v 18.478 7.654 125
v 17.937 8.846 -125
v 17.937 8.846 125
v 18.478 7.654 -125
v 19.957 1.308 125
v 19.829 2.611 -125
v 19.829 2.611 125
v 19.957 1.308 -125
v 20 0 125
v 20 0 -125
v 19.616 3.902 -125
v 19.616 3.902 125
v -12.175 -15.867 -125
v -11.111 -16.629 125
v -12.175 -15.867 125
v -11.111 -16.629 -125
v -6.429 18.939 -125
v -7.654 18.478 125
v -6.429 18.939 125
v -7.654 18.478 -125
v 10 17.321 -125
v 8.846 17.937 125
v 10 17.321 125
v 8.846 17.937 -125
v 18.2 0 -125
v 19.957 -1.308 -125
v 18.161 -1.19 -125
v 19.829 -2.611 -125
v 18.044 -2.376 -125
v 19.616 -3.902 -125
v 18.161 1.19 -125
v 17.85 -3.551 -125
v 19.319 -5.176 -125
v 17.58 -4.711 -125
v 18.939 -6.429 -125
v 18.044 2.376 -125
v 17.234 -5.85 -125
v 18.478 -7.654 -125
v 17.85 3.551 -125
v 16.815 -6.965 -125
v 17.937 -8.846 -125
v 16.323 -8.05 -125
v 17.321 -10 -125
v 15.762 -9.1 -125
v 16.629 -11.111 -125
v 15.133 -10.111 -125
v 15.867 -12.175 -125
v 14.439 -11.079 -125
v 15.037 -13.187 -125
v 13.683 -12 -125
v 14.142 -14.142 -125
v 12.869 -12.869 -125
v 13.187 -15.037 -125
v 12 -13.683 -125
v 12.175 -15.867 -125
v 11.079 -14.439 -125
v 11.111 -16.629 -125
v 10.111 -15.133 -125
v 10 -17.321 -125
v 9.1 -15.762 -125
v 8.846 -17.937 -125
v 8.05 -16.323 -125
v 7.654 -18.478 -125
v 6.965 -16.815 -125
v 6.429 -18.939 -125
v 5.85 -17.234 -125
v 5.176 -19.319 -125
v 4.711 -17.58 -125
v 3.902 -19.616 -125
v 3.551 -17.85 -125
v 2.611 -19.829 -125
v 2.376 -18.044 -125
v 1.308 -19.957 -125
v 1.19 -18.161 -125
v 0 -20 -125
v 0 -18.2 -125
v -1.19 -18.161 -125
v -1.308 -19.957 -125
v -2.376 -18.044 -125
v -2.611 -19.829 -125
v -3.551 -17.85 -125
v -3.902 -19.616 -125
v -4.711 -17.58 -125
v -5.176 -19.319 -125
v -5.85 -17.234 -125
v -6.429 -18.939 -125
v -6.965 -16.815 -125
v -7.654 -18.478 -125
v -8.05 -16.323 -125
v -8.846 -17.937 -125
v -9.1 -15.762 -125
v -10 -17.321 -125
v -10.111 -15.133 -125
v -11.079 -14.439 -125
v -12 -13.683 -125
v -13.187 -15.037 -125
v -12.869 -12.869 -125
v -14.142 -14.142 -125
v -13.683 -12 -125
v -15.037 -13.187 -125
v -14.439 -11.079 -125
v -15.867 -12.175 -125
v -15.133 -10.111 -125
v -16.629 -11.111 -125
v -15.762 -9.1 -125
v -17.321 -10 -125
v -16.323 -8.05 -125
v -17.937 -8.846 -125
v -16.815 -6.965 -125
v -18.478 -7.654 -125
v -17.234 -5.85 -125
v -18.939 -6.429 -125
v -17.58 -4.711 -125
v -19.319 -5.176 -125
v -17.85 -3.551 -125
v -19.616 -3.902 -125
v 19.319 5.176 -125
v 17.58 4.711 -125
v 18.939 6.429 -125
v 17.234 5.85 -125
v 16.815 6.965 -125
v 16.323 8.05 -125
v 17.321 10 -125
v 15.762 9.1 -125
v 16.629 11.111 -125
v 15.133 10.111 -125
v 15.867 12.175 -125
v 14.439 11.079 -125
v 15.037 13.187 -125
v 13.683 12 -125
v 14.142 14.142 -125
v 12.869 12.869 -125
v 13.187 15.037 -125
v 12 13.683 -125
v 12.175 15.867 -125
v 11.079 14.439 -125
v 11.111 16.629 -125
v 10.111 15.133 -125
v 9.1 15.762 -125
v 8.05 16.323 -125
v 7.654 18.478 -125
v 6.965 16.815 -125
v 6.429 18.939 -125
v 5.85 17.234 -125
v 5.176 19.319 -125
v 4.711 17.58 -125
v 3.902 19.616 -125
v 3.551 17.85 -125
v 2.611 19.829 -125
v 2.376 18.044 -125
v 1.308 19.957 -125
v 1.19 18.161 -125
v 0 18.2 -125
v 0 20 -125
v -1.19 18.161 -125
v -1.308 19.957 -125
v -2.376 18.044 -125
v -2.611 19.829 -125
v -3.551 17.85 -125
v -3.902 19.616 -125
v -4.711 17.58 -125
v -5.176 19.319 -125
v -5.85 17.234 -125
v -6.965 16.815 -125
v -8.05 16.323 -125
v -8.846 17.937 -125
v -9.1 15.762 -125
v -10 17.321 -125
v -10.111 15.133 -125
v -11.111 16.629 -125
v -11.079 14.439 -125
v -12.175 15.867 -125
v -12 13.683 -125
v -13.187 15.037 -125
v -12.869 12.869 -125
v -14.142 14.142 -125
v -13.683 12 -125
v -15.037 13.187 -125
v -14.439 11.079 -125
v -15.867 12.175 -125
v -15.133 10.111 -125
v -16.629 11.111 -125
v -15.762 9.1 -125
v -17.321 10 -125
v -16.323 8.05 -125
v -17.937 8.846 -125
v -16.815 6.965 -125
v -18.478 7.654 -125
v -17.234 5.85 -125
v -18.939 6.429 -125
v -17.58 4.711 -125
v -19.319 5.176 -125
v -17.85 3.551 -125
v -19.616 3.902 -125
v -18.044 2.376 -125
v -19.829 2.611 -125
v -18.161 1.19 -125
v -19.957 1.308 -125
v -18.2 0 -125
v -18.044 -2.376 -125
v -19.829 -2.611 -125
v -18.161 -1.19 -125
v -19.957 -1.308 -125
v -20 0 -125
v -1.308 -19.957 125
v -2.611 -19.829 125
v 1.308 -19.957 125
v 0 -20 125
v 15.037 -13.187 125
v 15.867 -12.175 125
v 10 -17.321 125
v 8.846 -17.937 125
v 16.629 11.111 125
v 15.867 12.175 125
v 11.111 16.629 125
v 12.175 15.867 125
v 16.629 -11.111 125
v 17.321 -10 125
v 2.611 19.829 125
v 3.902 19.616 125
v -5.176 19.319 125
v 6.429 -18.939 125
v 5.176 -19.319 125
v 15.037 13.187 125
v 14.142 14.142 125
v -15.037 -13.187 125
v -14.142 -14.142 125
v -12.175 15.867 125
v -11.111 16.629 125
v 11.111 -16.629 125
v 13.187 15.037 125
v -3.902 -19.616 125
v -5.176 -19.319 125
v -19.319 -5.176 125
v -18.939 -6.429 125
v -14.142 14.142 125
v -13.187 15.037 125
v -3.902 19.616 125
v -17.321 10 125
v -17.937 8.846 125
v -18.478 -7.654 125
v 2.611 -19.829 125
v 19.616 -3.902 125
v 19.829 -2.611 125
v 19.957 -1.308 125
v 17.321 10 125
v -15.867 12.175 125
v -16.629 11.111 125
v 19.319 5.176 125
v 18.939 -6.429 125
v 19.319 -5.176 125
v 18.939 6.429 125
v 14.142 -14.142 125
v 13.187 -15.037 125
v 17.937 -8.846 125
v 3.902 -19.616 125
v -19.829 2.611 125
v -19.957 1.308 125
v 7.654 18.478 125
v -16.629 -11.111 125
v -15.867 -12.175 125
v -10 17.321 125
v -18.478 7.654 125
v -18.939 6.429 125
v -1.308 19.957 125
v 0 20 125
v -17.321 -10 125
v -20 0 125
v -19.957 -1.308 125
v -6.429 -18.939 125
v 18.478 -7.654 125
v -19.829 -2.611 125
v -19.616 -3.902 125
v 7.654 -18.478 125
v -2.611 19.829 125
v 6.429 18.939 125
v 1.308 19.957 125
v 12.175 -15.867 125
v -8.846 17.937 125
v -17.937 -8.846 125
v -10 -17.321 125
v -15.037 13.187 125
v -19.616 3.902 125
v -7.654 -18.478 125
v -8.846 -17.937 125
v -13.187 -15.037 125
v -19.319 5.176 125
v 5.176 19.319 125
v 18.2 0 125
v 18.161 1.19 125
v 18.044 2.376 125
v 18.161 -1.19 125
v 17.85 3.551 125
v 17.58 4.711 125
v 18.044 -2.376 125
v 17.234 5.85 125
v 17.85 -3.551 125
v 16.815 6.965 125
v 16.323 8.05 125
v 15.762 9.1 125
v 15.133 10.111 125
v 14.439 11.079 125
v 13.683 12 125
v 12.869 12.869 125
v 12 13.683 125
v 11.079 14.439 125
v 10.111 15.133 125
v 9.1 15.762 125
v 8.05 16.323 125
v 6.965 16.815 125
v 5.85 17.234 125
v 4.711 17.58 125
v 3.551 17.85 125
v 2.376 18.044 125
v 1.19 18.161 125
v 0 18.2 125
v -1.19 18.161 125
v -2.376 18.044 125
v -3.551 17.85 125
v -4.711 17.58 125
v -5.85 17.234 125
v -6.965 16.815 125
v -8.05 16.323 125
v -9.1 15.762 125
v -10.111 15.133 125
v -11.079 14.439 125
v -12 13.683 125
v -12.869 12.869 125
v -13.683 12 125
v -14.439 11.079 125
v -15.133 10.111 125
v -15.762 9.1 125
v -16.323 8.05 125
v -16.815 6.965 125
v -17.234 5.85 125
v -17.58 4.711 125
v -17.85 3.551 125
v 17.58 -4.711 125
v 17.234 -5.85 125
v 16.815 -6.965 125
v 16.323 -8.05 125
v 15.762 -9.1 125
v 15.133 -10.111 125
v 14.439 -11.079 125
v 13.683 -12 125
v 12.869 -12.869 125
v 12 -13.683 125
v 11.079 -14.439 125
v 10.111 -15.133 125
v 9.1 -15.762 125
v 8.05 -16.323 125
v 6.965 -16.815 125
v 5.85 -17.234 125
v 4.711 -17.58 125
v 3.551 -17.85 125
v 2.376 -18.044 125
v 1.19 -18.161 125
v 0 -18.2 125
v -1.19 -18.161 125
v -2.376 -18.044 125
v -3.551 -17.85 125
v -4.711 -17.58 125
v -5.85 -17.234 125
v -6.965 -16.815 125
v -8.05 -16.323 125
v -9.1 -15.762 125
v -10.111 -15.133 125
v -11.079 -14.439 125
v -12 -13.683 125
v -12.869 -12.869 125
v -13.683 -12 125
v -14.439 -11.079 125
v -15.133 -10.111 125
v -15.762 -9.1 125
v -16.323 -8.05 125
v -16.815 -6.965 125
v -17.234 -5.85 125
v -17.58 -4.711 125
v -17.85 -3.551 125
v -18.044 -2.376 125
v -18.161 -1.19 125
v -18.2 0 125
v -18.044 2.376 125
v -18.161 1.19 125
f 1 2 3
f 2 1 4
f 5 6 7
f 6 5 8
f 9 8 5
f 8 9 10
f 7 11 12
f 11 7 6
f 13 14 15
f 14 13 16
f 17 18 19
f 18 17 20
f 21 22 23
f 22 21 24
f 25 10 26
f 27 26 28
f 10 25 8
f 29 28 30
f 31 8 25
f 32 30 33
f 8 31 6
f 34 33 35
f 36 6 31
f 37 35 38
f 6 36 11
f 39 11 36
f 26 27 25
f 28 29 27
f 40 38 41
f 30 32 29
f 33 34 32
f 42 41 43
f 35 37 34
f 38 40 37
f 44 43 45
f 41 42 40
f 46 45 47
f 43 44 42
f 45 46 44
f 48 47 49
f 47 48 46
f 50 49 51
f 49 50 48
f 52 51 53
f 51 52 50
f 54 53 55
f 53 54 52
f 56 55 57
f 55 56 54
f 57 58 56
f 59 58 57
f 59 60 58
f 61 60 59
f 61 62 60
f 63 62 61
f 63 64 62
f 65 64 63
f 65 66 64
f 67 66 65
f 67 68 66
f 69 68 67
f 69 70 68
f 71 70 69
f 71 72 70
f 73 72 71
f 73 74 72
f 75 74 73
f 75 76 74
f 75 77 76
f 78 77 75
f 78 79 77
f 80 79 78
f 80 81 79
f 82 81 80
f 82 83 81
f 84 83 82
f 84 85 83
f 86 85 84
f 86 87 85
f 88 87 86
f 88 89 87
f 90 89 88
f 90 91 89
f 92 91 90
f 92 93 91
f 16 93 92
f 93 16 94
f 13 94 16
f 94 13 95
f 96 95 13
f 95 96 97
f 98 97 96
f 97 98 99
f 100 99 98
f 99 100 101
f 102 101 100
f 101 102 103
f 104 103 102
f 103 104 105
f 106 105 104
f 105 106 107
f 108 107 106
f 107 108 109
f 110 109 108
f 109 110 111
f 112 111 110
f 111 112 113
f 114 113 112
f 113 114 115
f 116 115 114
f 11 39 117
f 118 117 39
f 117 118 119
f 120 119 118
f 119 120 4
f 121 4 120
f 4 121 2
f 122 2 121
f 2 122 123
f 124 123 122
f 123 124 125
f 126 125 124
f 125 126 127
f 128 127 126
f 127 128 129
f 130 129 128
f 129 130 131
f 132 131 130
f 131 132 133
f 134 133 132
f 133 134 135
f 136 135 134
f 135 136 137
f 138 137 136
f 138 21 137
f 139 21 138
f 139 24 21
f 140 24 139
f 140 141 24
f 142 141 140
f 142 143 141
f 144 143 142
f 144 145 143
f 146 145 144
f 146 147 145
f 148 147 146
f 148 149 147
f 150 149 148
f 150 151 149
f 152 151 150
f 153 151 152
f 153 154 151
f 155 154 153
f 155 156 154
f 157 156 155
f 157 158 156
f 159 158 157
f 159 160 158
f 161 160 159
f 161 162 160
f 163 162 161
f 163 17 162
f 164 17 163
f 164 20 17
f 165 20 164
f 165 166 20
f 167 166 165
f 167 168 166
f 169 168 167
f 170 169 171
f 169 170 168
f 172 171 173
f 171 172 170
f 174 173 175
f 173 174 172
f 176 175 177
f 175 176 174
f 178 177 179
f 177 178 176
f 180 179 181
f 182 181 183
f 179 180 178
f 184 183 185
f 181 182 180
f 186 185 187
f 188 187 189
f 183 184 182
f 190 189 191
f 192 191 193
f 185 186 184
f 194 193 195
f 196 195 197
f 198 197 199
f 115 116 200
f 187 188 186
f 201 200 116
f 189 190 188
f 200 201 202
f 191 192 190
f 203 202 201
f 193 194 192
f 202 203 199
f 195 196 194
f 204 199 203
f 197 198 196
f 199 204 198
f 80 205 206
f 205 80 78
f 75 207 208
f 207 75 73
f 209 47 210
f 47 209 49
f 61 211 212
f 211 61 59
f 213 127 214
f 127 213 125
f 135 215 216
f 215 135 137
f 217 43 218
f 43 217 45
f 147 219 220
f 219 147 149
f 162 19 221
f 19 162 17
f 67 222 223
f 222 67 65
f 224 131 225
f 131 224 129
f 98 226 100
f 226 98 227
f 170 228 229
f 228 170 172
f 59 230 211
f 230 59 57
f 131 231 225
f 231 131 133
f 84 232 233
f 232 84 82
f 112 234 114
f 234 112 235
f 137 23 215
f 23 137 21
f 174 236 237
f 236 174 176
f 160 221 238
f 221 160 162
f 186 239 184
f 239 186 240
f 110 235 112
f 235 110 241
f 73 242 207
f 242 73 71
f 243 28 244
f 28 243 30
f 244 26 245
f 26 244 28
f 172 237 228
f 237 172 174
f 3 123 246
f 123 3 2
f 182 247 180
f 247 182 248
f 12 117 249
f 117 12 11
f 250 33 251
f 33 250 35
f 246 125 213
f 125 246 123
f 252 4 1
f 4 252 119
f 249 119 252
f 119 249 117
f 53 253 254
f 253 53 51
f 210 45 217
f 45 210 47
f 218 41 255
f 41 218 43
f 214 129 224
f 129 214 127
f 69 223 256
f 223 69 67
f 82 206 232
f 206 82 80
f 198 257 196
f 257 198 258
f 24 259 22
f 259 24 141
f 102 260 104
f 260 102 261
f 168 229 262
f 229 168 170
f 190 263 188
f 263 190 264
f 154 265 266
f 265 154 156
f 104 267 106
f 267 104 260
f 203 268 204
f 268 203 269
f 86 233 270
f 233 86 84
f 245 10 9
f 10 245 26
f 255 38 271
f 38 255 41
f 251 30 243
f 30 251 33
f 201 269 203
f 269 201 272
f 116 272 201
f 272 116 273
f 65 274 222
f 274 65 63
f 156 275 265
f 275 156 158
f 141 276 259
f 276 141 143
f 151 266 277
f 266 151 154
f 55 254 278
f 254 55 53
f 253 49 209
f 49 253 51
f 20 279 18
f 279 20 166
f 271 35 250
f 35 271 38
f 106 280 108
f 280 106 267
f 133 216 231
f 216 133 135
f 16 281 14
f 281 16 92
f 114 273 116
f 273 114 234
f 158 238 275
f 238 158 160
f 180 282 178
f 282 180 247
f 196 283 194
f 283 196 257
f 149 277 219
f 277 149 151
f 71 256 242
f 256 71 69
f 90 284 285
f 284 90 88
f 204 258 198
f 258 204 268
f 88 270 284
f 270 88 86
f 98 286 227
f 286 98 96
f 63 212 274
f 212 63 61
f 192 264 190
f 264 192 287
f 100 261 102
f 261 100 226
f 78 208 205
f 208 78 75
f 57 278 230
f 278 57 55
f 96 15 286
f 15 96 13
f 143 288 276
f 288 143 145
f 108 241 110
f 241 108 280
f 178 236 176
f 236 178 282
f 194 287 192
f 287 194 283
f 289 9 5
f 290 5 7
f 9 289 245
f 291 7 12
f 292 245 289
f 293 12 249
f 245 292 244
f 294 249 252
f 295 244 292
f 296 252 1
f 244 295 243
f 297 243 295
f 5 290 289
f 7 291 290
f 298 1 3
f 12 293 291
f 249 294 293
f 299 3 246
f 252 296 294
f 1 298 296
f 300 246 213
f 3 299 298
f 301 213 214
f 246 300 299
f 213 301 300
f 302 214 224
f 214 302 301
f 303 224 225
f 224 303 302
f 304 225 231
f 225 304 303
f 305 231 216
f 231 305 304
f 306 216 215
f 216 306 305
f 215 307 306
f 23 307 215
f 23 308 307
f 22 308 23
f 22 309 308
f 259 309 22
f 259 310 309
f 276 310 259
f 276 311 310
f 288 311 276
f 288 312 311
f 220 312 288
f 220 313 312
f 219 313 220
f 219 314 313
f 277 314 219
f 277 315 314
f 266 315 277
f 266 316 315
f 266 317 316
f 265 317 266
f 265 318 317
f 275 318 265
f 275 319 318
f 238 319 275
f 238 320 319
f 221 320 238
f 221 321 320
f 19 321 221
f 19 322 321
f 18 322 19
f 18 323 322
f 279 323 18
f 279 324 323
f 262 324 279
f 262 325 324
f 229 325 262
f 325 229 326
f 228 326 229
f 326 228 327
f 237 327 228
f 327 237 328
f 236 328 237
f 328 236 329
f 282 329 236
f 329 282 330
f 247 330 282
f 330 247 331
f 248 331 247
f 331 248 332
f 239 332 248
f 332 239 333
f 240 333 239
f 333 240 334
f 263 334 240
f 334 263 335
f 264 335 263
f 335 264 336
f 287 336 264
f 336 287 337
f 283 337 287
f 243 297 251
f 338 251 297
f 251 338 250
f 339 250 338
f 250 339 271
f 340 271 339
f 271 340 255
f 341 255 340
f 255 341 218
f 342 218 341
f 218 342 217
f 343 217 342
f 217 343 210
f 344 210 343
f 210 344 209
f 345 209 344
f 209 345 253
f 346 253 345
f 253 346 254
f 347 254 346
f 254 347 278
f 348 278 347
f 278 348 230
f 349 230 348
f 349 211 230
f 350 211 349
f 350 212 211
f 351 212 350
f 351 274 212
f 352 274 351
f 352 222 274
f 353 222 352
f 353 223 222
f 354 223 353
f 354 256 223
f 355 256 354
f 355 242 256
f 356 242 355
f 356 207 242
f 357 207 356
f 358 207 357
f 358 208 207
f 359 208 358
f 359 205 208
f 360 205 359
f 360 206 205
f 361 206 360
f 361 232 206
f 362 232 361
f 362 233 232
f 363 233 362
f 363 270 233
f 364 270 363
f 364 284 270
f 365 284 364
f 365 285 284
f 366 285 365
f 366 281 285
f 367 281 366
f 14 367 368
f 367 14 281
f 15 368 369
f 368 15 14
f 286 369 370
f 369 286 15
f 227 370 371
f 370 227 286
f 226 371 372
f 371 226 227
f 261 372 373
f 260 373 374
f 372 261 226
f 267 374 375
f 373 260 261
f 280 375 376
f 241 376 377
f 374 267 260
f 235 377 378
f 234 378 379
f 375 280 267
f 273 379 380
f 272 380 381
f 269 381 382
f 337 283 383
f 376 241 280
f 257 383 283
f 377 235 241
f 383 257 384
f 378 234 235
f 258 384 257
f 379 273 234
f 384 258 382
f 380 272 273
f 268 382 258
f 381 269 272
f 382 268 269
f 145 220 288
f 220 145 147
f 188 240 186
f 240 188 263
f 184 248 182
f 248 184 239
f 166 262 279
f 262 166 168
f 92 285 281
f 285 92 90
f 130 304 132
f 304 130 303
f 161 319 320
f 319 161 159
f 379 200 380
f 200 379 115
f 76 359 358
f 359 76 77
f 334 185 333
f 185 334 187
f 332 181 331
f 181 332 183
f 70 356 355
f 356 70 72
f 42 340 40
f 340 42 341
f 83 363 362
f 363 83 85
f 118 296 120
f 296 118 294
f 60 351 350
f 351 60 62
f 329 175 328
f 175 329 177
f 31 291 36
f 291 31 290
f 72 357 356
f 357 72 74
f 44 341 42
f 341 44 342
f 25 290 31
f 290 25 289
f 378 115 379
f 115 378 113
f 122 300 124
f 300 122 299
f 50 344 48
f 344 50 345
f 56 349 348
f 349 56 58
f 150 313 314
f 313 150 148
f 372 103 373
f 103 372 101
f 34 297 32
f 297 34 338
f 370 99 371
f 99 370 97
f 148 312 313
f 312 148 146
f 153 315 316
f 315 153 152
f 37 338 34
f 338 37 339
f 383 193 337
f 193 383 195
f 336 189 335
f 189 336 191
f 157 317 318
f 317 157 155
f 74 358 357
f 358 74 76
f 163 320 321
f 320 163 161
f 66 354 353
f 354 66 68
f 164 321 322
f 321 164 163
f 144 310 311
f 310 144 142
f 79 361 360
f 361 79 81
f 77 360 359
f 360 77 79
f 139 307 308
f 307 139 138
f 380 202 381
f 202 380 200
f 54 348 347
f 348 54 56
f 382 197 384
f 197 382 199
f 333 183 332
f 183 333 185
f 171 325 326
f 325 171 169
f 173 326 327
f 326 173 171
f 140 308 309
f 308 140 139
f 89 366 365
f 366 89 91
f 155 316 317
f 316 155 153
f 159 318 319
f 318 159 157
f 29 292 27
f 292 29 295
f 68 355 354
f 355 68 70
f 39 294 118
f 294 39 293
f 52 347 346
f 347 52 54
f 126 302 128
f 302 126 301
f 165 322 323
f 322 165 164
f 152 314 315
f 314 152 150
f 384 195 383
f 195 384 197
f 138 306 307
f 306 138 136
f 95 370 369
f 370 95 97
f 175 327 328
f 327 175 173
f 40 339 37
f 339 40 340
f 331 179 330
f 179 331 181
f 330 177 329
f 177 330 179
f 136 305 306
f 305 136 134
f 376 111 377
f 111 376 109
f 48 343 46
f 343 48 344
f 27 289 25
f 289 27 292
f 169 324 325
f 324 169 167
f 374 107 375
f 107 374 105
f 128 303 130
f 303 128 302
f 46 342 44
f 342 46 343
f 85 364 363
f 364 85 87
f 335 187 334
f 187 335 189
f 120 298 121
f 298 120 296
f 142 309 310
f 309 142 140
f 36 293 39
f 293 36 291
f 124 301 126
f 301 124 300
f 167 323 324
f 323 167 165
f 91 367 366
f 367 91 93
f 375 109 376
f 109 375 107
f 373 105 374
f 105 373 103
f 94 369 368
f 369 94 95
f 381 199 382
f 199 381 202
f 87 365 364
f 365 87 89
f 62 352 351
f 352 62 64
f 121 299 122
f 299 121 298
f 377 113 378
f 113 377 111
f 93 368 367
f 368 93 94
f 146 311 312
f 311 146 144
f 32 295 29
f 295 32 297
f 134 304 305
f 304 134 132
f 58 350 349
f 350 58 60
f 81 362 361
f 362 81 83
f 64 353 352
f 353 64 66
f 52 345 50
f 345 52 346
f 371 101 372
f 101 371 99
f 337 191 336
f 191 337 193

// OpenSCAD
$fn=96;

module ht_pipe(od=40, wall=1.8, length=250) {
    difference() {
        cylinder(h=length, d=od, center=true);
        cylinder(h=length+2, d=od-2*wall, center=true);
    }
}

ht_pipe(od=40, wall=1.8, length=250);
